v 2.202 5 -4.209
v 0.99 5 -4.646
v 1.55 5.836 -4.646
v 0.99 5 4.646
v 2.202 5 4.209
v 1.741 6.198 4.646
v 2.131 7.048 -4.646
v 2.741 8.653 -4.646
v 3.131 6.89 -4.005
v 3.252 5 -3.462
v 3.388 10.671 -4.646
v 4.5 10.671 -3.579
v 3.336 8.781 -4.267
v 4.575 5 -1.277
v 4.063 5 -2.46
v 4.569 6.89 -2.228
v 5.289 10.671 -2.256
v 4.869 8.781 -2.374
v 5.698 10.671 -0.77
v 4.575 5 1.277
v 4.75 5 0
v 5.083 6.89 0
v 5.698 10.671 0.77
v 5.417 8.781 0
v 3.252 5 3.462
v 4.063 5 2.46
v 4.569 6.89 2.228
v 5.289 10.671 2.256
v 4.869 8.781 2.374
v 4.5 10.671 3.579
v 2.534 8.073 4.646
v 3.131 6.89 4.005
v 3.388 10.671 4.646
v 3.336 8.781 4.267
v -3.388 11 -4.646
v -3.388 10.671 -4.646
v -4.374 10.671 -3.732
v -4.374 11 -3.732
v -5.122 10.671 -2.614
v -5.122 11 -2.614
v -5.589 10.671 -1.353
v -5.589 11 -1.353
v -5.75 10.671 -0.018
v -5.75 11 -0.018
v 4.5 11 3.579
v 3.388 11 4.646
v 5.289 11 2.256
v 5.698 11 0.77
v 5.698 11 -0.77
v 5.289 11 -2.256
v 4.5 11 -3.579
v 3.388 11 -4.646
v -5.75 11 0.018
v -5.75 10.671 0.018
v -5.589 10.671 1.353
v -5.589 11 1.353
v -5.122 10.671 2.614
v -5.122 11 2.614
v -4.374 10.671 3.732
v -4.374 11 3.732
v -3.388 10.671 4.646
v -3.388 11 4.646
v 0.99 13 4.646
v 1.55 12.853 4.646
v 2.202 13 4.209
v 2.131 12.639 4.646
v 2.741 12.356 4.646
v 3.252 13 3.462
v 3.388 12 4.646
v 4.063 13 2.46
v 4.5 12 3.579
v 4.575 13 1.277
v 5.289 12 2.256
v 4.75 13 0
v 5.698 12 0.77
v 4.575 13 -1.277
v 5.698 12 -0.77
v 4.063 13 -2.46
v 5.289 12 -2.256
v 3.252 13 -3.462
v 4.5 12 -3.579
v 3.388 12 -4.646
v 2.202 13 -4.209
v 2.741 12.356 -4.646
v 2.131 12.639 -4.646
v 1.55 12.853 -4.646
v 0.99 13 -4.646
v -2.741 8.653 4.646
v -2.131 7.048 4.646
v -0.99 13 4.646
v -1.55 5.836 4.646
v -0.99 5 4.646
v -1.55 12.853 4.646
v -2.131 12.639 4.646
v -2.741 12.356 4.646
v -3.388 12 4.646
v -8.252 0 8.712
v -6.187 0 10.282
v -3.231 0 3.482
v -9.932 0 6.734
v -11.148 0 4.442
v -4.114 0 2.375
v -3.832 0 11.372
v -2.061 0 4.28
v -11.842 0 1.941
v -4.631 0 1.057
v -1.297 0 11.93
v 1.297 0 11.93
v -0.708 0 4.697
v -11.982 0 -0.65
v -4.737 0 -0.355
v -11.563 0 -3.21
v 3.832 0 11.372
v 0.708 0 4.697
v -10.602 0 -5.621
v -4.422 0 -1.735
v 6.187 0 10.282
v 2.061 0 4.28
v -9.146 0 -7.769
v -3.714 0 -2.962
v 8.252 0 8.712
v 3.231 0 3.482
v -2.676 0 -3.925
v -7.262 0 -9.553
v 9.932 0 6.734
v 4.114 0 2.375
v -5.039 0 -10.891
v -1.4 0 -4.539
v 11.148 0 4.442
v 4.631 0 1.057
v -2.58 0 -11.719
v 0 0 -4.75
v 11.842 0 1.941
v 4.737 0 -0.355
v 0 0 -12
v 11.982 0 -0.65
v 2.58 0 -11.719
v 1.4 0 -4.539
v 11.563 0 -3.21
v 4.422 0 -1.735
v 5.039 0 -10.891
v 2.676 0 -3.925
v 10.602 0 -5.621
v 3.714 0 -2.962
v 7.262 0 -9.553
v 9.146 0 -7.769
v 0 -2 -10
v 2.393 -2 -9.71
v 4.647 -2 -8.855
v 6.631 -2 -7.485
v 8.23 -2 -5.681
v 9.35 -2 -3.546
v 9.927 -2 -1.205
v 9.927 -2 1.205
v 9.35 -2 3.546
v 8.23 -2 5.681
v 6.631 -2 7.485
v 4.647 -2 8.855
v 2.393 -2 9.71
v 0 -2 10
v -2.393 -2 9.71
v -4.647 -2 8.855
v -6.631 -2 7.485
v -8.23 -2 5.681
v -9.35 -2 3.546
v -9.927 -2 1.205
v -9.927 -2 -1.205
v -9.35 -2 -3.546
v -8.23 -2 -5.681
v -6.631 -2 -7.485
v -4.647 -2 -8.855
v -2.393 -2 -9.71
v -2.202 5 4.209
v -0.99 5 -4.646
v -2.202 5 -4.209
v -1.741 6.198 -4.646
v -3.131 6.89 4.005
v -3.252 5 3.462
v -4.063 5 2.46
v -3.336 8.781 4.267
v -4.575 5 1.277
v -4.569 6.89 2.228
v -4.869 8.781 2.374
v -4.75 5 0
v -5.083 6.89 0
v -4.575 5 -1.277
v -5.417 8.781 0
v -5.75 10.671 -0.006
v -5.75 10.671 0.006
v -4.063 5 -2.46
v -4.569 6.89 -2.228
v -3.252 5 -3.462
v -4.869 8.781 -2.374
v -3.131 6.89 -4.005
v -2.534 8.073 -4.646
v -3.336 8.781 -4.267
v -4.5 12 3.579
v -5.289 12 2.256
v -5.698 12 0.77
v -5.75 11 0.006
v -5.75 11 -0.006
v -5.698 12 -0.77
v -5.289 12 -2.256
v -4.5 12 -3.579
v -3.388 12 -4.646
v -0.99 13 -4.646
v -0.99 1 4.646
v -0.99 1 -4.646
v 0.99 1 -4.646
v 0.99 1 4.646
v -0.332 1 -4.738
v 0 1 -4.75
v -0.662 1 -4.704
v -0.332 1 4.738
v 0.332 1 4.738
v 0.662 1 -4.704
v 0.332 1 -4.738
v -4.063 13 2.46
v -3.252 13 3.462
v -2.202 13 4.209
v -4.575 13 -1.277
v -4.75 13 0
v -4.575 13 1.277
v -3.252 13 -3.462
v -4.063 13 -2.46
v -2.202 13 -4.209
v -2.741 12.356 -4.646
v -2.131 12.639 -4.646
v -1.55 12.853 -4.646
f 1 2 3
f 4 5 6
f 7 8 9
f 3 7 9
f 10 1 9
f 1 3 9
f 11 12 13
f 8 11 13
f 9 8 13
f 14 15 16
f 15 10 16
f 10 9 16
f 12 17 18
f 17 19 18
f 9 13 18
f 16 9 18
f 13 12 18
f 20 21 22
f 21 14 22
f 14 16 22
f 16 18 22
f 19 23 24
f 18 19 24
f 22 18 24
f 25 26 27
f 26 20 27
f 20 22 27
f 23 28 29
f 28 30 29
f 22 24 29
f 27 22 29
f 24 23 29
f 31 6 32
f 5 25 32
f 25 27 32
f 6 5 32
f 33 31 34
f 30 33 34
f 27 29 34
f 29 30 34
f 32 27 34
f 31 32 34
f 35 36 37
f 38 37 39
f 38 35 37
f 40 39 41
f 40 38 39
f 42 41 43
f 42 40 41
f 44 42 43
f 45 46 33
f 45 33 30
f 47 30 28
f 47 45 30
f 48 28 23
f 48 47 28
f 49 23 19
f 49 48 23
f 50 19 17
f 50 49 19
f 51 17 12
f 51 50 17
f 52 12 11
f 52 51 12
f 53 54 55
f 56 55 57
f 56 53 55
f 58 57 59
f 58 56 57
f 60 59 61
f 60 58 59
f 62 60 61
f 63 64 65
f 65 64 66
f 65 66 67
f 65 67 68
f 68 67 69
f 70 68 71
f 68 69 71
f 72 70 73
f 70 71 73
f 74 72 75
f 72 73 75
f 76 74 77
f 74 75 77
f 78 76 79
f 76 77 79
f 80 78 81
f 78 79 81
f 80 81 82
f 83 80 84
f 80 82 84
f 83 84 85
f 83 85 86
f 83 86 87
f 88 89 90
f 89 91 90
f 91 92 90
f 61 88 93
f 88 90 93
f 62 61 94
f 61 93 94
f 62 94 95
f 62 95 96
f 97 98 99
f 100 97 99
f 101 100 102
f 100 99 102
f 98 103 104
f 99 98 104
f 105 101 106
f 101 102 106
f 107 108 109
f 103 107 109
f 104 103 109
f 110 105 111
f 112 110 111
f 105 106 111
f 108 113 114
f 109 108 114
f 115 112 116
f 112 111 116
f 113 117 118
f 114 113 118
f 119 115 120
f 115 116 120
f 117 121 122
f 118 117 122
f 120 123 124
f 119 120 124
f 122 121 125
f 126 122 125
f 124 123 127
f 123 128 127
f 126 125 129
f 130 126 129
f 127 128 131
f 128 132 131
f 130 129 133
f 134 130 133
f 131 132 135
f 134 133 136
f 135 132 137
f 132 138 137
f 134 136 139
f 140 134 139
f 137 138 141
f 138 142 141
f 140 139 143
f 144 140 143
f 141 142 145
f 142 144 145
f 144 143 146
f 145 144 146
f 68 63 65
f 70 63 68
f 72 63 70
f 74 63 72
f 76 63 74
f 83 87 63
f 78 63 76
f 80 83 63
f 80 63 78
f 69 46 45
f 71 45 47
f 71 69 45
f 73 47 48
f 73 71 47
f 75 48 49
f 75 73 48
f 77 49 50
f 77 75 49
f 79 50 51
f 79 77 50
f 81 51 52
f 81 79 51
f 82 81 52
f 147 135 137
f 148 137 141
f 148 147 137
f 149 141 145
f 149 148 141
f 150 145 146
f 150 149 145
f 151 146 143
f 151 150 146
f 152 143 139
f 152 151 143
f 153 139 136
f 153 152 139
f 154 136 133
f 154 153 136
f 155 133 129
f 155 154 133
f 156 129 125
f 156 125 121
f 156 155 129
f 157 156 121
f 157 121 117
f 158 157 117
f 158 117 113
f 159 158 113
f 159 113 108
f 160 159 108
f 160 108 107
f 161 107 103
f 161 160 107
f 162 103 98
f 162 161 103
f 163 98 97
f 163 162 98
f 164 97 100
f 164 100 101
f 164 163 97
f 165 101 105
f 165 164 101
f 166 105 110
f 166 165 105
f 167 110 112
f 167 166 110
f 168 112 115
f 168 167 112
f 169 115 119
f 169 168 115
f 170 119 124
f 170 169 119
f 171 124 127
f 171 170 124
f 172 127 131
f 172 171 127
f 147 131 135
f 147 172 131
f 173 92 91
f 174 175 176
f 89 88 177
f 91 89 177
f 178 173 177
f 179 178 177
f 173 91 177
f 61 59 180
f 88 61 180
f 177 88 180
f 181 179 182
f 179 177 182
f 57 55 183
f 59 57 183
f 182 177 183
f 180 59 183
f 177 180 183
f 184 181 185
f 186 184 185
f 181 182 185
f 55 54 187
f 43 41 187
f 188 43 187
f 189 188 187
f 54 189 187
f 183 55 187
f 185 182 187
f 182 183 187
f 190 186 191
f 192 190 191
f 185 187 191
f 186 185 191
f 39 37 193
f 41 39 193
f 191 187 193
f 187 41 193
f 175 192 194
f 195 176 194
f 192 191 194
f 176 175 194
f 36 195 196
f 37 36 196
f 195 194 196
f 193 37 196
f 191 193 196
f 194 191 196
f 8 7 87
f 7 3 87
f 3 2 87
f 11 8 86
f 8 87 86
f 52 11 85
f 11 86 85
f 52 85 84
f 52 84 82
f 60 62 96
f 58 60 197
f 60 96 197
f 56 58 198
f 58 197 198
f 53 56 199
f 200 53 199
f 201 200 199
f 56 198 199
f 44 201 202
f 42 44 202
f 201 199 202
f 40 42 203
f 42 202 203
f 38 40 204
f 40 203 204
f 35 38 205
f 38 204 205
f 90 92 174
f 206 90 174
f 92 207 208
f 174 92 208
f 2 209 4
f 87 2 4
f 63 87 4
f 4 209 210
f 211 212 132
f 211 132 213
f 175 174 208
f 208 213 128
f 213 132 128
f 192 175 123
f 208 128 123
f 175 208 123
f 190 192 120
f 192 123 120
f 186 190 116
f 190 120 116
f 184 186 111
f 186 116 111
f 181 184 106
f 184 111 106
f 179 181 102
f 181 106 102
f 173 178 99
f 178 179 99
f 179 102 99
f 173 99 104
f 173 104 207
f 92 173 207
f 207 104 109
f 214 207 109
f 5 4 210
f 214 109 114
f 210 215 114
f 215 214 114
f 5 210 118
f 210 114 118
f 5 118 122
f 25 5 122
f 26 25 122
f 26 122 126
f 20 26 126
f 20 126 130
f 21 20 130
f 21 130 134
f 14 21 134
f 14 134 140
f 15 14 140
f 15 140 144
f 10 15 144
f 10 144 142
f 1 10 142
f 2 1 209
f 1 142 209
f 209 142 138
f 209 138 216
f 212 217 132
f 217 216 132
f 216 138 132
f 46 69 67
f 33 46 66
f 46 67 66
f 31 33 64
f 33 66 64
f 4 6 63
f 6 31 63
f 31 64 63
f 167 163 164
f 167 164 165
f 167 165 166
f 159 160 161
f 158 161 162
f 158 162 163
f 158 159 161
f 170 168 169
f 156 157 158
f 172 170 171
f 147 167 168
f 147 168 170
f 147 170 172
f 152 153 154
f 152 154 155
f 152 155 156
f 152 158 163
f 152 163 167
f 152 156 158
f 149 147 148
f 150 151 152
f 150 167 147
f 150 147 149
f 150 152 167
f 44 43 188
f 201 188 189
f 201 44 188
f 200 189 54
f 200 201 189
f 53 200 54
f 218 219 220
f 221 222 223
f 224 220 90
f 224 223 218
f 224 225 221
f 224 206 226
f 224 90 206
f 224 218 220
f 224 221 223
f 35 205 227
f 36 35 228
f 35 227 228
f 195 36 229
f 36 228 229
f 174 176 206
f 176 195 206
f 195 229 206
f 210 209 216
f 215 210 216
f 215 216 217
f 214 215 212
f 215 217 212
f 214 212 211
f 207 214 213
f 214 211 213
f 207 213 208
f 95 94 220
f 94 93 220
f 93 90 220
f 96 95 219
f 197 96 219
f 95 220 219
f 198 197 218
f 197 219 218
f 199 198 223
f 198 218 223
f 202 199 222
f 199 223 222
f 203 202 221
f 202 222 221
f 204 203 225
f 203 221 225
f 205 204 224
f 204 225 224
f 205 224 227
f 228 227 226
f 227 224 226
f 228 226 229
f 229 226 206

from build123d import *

# Parameters (mm, degrees)
SKETCH1_R           = 4.75
BOSS_EXTRUDE1_DEPTH = 13
SKETCH2_R           = 12
BOSS_EXTRUDE2_DEPTH = 2
CHAMFER1_SIZE       = 2
CUT_EXTRUDE1_START  = -12
CUT_EXTRUDE1_DEPTH  = 12
BOSS_EXTRUDE3_DEPTH = 2
CHAMFER3_SIZE       = 6
CHAMFER3_SIZE_2     = 1.057961884
CHAMFER4_SIZE       = 1


# Some blends are built 0.0001 mm under size
with BuildPart() as part:
    # Sketch1 → Boss-Extrude1 (new body)
    with BuildSketch(Plane(origin=(0, 0, 0), x_dir=(1, 0, 0), z_dir=(0, 1, 0))):
        with Locations(Location((0, 0, 0), (0, 0, 90))):
            Circle(SKETCH1_R)
    extrude(amount=BOSS_EXTRUDE1_DEPTH)

    # Sketch2 → Boss-Extrude2 (add)
    with BuildSketch(Plane.XZ):
        with Locations(Location((0, 0, 0), (0, 0, 270))):
            Circle(SKETCH2_R)
    extrude(amount=BOSS_EXTRUDE2_DEPTH)

    # Chamfer1
    chamfer1_edges = [part.edges().sort_by_distance(p)[0] for p in [
        (0, -2, 12),
    ]]
    chamfer(chamfer1_edges, length=CHAMFER1_SIZE - 0.0001)  # a hair under: the kernel refuses the full size

    # Sketch4 → Cut-Extrude1 (cut)
    with BuildSketch(Plane(origin=(0, 13, 0), x_dir=(1, 0, 0), z_dir=(0, 1, 0)).offset(CUT_EXTRUDE1_START)):
        with BuildLine():
            Line((-0.989583333, -4.645774944), (-0.989583333, 4.645774944))
            ThreePointArc((-0.989583333, 4.645774944), (0, 4.75), (0.989583333, 4.645774944))
            Line((0.989583333, 4.645774944), (0.989583333, -4.645774944))
            ThreePointArc((0.989583333, -4.645774944), (0, -4.75), (-0.989583333, -4.645774944))
        make_face()
    extrude(amount=CUT_EXTRUDE1_DEPTH, mode=Mode.SUBTRACT)

    # Sketch5 → Boss-Extrude3 (add)
    with BuildSketch(Plane(origin=(0, 13, 0), x_dir=(1, 0, 0), z_dir=(0, 1, 0))):
        with BuildLine():
            Line((1.197916667, -4.645774944), (3.388107905, -4.645774944))
            ThreePointArc((3.388107905, -4.645774944), (5.75, 0), (3.388107905, 4.645774944))
            Line((3.388107905, 4.645774944), (1.197916667, 4.645774944))
            Line((1.197916667, 4.645774944), (0.989583333, 4.645774944))
            Line((0.989583333, 4.645774944), (0.989583333, -4.645774944))
            Line((0.989583333, -4.645774944), (1.197916667, -4.645774944))
        make_face()
        with BuildLine():
            Line((-1.197916667, -4.645774944), (-3.388107905, -4.645774944))
            ThreePointArc((-3.388107905, -4.645774944), (-5.75, 0), (-3.388107905, 4.645774944))
            Line((-3.388107905, 4.645774944), (-1.197916667, 4.645774944))
            Line((-1.197916667, 4.645774944), (-0.989583333, 4.645774944))
            Line((-0.989583333, 4.645774944), (-0.989583333, -4.645774944))
            Line((-0.989583333, -4.645774944), (-1.197916667, -4.645774944))
        make_face()
    extrude(amount=-BOSS_EXTRUDE3_DEPTH)

    # Chamfer3
    # the kernel refuses this chamfer: 6, 1.057961884 mm, written as the material it adds along each edge
    with BuildSketch(Plane(origin=(0, 11, 0), x_dir=(-0.9999950652018581, 0, -0.0031415874858794902), z_dir=(-0.0031415874858794902, 0, 0.9999950652018581))) as chamfer3_piece_1_section:
        Polygon((4.75, CHAMFER3_SIZE), (4.75 + CHAMFER3_SIZE_2, 0), (4.75, 0), align=None)
    chamfer3_piece_1 = revolve(axis=Axis((0, 11, 0), (0, -1, 0)), revolution_arc=359.64, mode=Mode.PRIVATE)
    chamfer3_piece_1 = split(chamfer3_piece_1, bisect_by=Plane(origin=(-4.007024844, 8.962519636, 4.645774944), z_dir=(0, 0, -1)), keep=Keep.TOP, mode=Mode.PRIVATE)
    chamfer3_piece_1 = split(chamfer3_piece_1, bisect_by=Plane(origin=(-4.007024844, 8.962519636, -4.645774944), z_dir=(0, 0, 1)), keep=Keep.TOP, mode=Mode.PRIVATE)
    chamfer3_piece_1 = chamfer3_piece_1 & Plane(origin=(0, 8.962519636, 0), x_dir=(0.5892361573319569, 0, 0.8079608597529149), z_dir=(0, 1, 0)) * Cylinder(5.75, 24, mode=Mode.PRIVATE)
    add(chamfer3_piece_1)
    with BuildSketch(Plane(origin=(0, 11, 0), x_dir=(0.9999950652018581, 0, 0.003141587485879146), z_dir=(0.003141587485879146, 0, -0.9999950652018581))) as chamfer3_piece_2_section:
        Polygon((4.75, CHAMFER3_SIZE), (4.75 + CHAMFER3_SIZE_2, 0), (4.75, 0), align=None)
    chamfer3_piece_2 = revolve(axis=Axis((0, 11, 0), (0, -1, 0)), revolution_arc=359.64, mode=Mode.PRIVATE)
    chamfer3_piece_2 = split(chamfer3_piece_2, bisect_by=Plane(origin=(4.007024844, 8.962519636, 4.645774944), z_dir=(0, 0, -1)), keep=Keep.TOP, mode=Mode.PRIVATE)
    chamfer3_piece_2 = split(chamfer3_piece_2, bisect_by=Plane(origin=(4.007024844, 8.962519636, -4.645774944), z_dir=(0, 0, 1)), keep=Keep.TOP, mode=Mode.PRIVATE)
    chamfer3_piece_2 = chamfer3_piece_2 & Plane(origin=(0, 8.962519636, 0), x_dir=(0.5892361573319569, 0, 0.8079608597529149), z_dir=(0, 1, 0)) * Cylinder(5.75, 24, mode=Mode.PRIVATE)
    add(chamfer3_piece_2)

    # Chamfer4
    chamfer4_edges = [part.edges().sort_by_distance(p)[0] for p in [
        (5.75, 13, 0),
        (-5.75, 13, 0),
    ]]
    chamfer(chamfer4_edges, length=CHAMFER4_SIZE)


solid = part.part
